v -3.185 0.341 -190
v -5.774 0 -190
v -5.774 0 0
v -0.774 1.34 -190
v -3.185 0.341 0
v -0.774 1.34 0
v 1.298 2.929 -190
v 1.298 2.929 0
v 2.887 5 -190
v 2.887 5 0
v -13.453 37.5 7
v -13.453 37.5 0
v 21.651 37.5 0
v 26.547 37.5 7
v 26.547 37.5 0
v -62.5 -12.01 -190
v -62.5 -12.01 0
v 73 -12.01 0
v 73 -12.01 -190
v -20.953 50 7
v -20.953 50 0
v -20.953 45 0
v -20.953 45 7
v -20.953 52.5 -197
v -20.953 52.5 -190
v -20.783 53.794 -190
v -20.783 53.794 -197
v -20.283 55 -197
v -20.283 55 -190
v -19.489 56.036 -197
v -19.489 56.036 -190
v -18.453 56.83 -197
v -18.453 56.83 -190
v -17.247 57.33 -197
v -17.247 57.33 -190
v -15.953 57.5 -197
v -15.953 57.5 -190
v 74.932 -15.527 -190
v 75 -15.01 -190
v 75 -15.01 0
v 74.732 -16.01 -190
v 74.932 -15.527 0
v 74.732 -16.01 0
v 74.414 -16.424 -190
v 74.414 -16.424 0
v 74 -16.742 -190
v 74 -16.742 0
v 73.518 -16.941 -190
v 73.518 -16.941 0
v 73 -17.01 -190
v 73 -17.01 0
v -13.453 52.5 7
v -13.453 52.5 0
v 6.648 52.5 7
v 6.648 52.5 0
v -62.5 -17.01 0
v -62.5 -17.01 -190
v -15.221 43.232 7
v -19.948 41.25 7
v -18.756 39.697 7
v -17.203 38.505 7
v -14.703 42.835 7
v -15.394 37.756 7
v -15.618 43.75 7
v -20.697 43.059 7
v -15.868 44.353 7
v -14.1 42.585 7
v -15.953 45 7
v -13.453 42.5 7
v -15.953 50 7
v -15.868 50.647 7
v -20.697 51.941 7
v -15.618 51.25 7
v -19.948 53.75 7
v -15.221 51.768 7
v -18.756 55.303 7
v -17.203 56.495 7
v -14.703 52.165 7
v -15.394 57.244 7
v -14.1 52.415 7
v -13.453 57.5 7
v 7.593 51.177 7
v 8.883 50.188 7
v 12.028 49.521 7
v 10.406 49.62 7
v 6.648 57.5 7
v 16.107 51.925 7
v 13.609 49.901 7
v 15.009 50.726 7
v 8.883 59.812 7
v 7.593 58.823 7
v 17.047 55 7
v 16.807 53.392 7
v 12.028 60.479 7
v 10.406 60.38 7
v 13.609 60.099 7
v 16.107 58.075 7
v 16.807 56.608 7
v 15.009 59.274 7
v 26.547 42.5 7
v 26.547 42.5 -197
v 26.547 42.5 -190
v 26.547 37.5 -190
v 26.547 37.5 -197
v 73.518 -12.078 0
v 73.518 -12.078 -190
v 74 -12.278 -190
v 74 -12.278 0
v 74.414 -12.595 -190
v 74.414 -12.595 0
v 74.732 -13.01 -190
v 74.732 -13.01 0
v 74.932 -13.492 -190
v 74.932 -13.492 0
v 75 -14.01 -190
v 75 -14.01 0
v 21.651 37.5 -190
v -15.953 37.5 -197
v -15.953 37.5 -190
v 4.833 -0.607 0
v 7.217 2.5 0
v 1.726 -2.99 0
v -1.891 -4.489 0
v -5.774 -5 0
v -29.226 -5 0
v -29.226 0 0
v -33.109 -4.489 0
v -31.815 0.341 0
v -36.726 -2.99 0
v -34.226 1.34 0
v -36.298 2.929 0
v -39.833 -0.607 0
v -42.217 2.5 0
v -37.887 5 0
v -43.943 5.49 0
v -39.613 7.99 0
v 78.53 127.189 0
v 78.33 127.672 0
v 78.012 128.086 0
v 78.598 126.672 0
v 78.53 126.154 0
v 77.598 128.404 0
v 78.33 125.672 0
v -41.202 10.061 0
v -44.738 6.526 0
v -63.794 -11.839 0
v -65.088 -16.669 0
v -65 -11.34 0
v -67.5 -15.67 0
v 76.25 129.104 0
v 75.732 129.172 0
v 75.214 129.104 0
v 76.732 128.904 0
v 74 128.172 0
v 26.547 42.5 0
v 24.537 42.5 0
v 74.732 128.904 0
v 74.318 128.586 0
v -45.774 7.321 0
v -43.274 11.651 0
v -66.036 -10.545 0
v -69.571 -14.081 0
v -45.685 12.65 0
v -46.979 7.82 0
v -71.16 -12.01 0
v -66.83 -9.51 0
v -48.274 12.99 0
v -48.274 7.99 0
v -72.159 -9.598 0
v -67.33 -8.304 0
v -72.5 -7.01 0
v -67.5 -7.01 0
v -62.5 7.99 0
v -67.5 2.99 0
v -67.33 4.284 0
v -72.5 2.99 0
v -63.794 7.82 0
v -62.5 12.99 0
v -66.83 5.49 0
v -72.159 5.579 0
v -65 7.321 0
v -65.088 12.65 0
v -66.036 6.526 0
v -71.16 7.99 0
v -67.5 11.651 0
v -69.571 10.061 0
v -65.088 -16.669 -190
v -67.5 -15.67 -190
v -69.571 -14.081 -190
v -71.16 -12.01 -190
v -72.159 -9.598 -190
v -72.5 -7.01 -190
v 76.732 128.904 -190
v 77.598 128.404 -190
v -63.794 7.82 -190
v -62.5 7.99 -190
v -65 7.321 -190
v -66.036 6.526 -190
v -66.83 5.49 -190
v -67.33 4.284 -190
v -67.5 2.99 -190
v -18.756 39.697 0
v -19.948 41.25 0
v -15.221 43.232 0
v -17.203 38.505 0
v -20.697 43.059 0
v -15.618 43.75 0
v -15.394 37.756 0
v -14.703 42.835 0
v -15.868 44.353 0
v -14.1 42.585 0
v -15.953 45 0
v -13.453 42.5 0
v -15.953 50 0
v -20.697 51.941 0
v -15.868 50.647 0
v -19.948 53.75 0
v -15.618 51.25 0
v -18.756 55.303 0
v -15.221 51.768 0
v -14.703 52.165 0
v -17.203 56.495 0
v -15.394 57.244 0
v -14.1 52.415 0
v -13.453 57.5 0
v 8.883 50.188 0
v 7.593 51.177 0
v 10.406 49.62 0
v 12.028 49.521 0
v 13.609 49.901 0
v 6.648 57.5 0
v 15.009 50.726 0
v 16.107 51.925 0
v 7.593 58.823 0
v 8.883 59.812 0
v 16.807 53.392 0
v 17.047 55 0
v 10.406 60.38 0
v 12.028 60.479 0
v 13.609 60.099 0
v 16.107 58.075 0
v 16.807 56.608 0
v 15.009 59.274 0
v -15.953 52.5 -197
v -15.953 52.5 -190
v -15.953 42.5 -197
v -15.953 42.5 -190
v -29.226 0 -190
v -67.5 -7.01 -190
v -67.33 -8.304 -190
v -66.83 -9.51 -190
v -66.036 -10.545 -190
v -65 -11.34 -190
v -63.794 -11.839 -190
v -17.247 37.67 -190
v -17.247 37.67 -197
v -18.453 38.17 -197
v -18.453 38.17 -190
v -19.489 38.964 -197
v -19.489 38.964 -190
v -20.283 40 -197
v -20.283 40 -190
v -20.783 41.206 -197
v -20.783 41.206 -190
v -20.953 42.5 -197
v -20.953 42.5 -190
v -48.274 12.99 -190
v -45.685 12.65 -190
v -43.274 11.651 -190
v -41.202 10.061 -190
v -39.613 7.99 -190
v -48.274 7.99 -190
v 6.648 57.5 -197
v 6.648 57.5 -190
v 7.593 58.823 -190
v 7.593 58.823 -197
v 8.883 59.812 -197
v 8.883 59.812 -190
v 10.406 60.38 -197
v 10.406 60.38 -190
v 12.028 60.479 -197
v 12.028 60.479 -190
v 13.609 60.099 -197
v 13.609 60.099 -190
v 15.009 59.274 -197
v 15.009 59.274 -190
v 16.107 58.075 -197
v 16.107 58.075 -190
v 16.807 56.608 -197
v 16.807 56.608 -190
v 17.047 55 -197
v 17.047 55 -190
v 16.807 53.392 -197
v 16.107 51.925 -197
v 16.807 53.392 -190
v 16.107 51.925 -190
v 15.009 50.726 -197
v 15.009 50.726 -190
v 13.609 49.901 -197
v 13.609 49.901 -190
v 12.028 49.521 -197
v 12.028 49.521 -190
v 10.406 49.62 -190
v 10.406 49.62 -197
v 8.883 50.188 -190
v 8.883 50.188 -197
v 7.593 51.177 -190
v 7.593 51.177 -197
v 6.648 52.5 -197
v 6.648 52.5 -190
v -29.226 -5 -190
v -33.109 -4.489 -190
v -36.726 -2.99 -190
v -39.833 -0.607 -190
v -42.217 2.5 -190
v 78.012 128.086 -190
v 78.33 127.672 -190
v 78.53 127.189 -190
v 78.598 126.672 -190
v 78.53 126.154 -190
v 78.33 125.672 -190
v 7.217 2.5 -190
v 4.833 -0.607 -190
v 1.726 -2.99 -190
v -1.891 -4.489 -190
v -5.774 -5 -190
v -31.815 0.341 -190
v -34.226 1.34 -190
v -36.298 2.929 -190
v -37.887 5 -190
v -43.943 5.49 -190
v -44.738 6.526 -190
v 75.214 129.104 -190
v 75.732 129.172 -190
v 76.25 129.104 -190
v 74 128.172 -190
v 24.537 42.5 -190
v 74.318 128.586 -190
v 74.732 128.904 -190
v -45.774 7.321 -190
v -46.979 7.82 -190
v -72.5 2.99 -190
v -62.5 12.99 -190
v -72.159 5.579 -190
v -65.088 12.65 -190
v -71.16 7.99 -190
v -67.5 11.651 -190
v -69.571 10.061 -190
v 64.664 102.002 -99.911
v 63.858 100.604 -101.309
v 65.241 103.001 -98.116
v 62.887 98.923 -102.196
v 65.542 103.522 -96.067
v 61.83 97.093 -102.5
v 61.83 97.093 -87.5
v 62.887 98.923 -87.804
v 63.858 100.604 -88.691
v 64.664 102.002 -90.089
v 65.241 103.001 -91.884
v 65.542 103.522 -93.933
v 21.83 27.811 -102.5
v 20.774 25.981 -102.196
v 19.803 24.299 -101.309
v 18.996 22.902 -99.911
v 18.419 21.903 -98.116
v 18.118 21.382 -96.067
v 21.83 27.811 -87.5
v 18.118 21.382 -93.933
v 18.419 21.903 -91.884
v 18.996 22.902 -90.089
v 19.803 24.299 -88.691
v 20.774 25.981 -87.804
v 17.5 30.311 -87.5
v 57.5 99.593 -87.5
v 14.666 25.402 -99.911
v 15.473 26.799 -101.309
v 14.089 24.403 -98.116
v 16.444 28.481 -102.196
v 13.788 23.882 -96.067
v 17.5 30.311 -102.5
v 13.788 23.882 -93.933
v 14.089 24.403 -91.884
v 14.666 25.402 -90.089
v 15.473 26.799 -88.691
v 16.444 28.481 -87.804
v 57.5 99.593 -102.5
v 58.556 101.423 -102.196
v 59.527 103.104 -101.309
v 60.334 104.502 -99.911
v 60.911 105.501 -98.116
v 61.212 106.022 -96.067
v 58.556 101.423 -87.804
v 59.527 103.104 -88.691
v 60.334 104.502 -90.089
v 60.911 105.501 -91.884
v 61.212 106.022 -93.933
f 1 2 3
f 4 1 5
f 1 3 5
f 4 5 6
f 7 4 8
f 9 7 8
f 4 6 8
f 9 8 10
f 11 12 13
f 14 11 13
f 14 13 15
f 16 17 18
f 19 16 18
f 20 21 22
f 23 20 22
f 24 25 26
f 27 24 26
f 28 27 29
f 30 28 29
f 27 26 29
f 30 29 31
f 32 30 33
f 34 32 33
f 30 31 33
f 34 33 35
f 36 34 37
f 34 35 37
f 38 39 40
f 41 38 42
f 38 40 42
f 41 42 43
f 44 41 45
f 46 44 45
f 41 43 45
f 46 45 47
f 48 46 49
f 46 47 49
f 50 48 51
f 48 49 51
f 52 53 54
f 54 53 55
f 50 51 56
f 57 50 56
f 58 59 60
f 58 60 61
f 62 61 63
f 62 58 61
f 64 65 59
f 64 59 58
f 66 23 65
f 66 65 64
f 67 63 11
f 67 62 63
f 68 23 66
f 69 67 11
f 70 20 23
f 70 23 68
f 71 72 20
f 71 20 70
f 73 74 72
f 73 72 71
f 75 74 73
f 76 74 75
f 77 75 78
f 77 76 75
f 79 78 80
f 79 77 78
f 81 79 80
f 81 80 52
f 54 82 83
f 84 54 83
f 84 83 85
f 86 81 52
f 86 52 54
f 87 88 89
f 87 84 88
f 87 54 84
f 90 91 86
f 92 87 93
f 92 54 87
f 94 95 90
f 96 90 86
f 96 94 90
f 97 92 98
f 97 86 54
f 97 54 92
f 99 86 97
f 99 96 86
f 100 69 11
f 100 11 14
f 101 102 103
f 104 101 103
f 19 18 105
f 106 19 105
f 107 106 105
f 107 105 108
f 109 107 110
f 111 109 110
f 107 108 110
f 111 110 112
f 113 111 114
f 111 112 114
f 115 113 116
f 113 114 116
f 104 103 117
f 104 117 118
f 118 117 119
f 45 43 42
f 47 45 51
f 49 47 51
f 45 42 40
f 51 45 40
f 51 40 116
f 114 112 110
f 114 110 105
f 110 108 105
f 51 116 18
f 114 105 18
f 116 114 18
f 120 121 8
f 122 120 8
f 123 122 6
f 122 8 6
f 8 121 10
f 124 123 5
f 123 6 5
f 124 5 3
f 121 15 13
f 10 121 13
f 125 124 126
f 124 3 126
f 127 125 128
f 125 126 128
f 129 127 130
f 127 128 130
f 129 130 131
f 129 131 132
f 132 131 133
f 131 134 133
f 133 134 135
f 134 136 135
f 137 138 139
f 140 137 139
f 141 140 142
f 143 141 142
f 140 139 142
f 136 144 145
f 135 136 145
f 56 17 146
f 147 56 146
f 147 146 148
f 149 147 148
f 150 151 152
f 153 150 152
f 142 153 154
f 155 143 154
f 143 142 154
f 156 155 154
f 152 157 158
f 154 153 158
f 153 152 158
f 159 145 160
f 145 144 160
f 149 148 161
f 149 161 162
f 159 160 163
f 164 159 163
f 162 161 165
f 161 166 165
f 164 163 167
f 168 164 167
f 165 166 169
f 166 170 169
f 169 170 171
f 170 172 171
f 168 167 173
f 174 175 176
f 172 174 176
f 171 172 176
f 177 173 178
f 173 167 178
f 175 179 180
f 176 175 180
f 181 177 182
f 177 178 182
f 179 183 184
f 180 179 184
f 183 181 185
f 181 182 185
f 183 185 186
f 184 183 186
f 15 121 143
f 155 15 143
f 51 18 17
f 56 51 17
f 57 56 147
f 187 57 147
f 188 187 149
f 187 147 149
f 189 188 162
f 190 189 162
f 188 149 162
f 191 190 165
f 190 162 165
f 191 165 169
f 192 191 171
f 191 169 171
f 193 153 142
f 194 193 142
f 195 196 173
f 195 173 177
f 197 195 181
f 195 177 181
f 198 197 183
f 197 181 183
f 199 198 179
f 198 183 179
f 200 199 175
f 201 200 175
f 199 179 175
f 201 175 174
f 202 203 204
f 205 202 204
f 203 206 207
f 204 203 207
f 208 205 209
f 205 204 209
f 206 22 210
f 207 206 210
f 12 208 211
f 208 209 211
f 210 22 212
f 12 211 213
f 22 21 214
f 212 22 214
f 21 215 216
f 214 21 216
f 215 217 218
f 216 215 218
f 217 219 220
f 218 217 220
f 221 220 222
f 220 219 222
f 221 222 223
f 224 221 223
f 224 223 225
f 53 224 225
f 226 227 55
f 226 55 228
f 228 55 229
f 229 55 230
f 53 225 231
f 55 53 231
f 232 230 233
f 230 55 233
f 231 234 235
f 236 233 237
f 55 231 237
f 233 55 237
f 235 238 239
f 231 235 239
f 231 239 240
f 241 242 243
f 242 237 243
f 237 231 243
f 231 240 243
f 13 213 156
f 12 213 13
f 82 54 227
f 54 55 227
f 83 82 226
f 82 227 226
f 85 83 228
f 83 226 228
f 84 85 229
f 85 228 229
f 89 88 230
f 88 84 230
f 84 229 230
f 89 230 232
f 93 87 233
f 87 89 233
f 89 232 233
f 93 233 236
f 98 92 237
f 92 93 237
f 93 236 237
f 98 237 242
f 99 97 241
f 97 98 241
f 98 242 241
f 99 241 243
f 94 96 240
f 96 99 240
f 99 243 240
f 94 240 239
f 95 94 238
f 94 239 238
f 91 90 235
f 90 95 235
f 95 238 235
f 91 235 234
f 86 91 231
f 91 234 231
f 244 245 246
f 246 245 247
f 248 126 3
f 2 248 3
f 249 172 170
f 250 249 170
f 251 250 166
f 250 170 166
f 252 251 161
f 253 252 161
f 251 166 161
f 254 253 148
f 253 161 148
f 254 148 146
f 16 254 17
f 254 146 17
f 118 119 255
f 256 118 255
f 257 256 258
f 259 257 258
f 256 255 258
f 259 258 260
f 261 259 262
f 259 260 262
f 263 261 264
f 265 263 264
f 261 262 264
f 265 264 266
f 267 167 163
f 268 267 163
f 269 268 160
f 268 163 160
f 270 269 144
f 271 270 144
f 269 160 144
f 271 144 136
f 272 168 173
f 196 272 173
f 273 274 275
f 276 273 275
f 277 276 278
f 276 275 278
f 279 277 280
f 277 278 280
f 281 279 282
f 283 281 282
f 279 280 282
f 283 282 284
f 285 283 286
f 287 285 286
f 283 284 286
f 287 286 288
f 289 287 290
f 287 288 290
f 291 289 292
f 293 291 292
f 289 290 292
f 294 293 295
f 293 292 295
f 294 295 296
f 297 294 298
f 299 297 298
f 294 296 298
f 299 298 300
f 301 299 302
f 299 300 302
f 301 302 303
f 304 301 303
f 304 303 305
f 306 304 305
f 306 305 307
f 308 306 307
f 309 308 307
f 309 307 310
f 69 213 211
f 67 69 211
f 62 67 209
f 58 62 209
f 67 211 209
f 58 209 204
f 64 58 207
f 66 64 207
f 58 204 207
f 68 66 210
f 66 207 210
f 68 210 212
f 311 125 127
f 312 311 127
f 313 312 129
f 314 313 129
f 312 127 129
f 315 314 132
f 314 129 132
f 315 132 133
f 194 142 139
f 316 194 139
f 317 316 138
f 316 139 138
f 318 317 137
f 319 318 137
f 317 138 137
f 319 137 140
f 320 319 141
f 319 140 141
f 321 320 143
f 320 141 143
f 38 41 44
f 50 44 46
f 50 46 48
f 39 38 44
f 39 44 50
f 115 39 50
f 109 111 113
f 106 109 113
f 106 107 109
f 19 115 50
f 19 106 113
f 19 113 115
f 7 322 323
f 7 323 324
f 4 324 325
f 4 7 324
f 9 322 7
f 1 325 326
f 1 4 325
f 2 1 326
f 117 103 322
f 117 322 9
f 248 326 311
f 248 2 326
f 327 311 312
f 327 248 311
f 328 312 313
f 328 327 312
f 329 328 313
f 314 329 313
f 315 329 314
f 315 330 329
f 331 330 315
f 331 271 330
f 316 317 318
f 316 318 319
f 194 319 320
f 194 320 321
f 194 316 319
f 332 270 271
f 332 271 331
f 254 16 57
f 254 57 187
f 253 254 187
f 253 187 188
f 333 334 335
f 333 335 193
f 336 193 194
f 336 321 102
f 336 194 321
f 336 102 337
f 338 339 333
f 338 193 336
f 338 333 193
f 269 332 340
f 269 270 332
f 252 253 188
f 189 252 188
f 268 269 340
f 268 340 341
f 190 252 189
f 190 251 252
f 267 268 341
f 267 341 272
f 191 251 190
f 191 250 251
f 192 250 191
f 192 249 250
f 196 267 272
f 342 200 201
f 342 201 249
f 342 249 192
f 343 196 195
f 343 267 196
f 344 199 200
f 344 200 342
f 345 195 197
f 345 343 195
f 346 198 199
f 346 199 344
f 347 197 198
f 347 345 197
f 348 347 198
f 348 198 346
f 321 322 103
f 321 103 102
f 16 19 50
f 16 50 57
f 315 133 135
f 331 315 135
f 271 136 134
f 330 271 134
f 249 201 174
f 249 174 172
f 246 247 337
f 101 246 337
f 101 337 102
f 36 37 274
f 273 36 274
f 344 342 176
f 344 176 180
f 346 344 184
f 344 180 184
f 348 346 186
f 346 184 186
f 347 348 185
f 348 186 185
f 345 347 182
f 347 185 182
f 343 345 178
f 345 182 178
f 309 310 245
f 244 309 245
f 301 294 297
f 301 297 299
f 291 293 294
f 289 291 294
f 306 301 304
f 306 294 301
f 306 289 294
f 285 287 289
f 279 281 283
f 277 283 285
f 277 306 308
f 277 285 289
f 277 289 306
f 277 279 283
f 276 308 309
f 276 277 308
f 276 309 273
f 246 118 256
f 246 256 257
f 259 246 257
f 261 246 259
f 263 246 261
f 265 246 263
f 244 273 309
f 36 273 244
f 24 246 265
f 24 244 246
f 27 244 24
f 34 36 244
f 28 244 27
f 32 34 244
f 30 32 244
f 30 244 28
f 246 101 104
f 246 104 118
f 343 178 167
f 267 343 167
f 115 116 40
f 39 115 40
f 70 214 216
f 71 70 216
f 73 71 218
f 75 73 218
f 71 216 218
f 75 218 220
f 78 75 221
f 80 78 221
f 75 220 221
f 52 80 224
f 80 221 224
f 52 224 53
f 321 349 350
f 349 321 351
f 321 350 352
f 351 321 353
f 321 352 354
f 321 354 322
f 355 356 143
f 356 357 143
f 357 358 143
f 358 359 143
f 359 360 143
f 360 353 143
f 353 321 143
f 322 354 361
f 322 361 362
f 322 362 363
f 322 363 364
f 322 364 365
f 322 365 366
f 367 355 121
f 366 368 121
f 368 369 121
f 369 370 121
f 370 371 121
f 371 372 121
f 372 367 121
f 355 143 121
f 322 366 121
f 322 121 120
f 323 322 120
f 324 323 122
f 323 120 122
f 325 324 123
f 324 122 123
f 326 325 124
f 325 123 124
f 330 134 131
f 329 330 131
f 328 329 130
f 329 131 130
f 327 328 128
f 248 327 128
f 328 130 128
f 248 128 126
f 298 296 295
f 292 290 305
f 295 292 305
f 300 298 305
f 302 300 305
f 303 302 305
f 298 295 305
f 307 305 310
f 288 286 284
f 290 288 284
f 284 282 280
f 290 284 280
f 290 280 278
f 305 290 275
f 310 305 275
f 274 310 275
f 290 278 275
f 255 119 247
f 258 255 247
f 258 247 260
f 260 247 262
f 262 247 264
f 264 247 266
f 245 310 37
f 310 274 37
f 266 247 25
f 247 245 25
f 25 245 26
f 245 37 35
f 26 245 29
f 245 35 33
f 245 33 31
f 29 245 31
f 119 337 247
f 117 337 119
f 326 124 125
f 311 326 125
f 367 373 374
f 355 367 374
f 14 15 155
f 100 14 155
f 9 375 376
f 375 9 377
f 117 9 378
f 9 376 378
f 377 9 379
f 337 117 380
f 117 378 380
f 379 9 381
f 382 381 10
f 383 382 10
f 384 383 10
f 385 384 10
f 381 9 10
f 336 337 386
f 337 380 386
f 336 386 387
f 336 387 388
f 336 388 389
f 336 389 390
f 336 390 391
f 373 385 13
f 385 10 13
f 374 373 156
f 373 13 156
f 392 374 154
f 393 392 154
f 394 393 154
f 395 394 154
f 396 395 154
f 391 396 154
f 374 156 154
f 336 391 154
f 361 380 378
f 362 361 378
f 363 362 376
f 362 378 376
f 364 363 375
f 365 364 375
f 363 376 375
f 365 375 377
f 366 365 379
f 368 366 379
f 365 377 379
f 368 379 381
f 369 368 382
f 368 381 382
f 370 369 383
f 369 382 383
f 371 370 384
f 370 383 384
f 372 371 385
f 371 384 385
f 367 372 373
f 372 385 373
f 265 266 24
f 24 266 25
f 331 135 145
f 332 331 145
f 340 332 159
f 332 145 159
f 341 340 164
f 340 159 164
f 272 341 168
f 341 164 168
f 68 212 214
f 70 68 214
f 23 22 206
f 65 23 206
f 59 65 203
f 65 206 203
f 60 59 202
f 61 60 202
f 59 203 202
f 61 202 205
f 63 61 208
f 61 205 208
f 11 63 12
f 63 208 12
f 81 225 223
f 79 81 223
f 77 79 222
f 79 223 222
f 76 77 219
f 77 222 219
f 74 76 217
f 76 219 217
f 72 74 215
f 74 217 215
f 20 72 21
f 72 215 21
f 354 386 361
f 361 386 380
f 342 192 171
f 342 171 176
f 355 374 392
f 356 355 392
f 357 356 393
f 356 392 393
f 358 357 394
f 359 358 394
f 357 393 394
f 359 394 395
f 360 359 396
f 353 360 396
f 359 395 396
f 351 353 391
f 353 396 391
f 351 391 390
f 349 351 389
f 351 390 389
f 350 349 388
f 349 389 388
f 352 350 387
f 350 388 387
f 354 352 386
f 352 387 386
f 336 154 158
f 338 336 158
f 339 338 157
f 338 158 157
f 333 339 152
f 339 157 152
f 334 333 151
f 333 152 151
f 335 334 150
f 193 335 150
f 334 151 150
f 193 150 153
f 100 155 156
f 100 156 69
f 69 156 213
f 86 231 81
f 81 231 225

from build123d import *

# Parameters (mm, degrees)
EXTRUDE_12_DEPTH    = 190
CUT_EXTRUDE_1_REACH = 78.573
SKETCH_3_12_R       = 5.5
EXTRUDE_13_DEPTH    = 7
EXTRUDE_14_DEPTH    = 7
EXTRUDE_16_DEPTH    = 7


with BuildPart() as part:
    # Sketch 3 → Extrude 12 (new body)
    with BuildSketch(Plane.XY):
        with BuildLine():
            ThreePointArc((74, 128.17175976), (75.214412717, 129.103611413), (76.732050808, 128.903810568))
            Line((76.732050808, 128.903810568), (77.598076211, 128.403810568))
            ThreePointArc((77.598076211, 128.403810568), (78.529927864, 127.18939785), (78.330127019, 125.67175976))
            Line((78.330127019, 125.67175976), (7.216878365, 2.5))
            ThreePointArc((7.216878365, 2.5), (1.726497308, -2.990381057), (-5.773502692, -5))
            Line((-5.773502692, -5), (-29.226497308, -5))
            ThreePointArc((-29.226497308, -5), (-36.726497308, -2.990381057), (-42.216878365, 2.5))
            Line((-42.216878365, 2.5), (-43.943375673, 5.490381057))
            ThreePointArc((-43.943375673, 5.490381057), (-45.773502692, 7.320508076), (-48.273502692, 7.990381057))
            Line((-48.273502692, 7.990381057), (-62.5, 7.990381057))
            ThreePointArc((-62.5, 7.990381057), (-66.035533906, 6.525914963), (-67.5, 2.990381057))
            Line((-67.5, 2.990381057), (-67.5, -7.009618943))
            ThreePointArc((-67.5, -7.009618943), (-66.035533906, -10.545152849), (-62.5, -12.009618943))
            Line((-62.5, -12.009618943), (73, -12.009618943))
            ThreePointArc((73, -12.009618943), (74.414213562, -12.595405381), (75, -14.009618943))
            Line((75, -14.009618943), (75, -15.009618943))
            ThreePointArc((75, -15.009618943), (74.414213562, -16.423832506), (73, -17.009618943))
            Line((73, -17.009618943), (-62.5, -17.009618943))
            ThreePointArc((-62.5, -17.009618943), (-69.571067812, -14.080686755), (-72.5, -7.009618943))
            Line((-72.5, -7.009618943), (-72.5, 2.990381057))
            ThreePointArc((-72.5, 2.990381057), (-69.571067812, 10.061448869), (-62.5, 12.990381057))
            Line((-62.5, 12.990381057), (-48.273502692, 12.990381057))
            ThreePointArc((-48.273502692, 12.990381057), (-43.273502692, 11.650635095), (-39.613248654, 7.990381057))
            Line((-39.613248654, 7.990381057), (-37.886751346, 5))
            ThreePointArc((-37.886751346, 5), (-34.226497308, 1.339745962), (-29.226497308, 0))
            Line((-29.226497308, 0), (-5.773502692, 0))
            ThreePointArc((-5.773502692, 0), (-0.773502692, 1.339745962), (2.886751346, 5))
            Line((2.886751346, 5), (74, 128.17175976))
        make_face()
    extrude(amount=-EXTRUDE_12_DEPTH)

    # Sketch 19 → Cut-Extrude 1 (cut, up to next)
    with BuildSketch(Plane(origin=(0, 0, 0), x_dir=(0, 0, 1), z_dir=(-0.866025404, 0.5, 0)), mode=Mode.PRIVATE) as cut_extrude_1_sk1:
        with BuildLine():
            Line((-95, 107.5), (-95, 115))
            Line((-95, 115), (-102.5, 115))
            ThreePointArc((-102.5, 115), (-100.303300859, 109.696699141), (-95, 107.5))
        make_face()
    cut_extrude_1_tool1 = extrude(cut_extrude_1_sk1.sketch, amount=-CUT_EXTRUDE_1_REACH, mode=Mode.PRIVATE) & part.part
    add(cut_extrude_1_tool1.solids().sort_by_distance((55.908451, 96.836277, -98.183099))[0], mode=Mode.SUBTRACT)
    # Sketch 19 → Cut-Extrude 1 (cut, up to next)
    with BuildSketch(Plane(origin=(0, 0, 0), x_dir=(0, 0, 1), z_dir=(-0.866025404, 0.5, 0)), mode=Mode.PRIVATE) as cut_extrude_1_sk2:
        with BuildLine():
            Line((-87.5, 115), (-95, 115))
            Line((-95, 115), (-95, 107.5))
            ThreePointArc((-95, 107.5), (-89.696699141, 109.696699141), (-87.5, 115))
        make_face()
    cut_extrude_1_tool2 = extrude(cut_extrude_1_sk2.sketch, amount=-CUT_EXTRUDE_1_REACH, mode=Mode.PRIVATE) & part.part
    add(cut_extrude_1_tool2.solids().sort_by_distance((55.908451, 96.836277, -91.816901))[0], mode=Mode.SUBTRACT)
    # Sketch 19 → Cut-Extrude 1 (cut, up to next)
    with BuildSketch(Plane(origin=(0, 0, 0), x_dir=(0, 0, 1), z_dir=(-0.866025404, 0.5, 0)), mode=Mode.PRIVATE) as cut_extrude_1_sk3:
        with BuildLine():
            Line((-102.5, 115), (-95, 115))
            Line((-95, 115), (-87.5, 115))
            ThreePointArc((-87.5, 115), (-95, 122.5), (-102.5, 115))
        make_face()
    cut_extrude_1_tool3 = extrude(cut_extrude_1_sk3.sketch, amount=-CUT_EXTRUDE_1_REACH, mode=Mode.PRIVATE) & part.part
    add(cut_extrude_1_tool3.solids().sort_by_distance((59.091549, 102.349566, -95))[0], mode=Mode.SUBTRACT)
    # Sketch 19 → Cut-Extrude 1 (cut, up to next)
    with BuildSketch(Plane(origin=(0, 0, 0), x_dir=(0, 0, 1), z_dir=(-0.866025404, 0.5, 0)), mode=Mode.PRIVATE) as cut_extrude_1_sk4:
        with BuildLine():
            ThreePointArc((-95, 107.5), (-100.303300859, 109.696699141), (-102.5, 115))
            Line((-102.5, 115), (-102.5, 35))
            ThreePointArc((-102.5, 35), (-100.303300859, 40.303300859), (-95, 42.5))
            Line((-95, 42.5), (-95, 107.5))
        make_face()
    cut_extrude_1_tool4 = extrude(cut_extrude_1_sk4.sketch, amount=-CUT_EXTRUDE_1_REACH, mode=Mode.PRIVATE) & part.part
    add(cut_extrude_1_tool4.solids().sort_by_distance((37.5, 64.951905, -98.8479))[0], mode=Mode.SUBTRACT)
    # Sketch 19 → Cut-Extrude 1 (cut, up to next)
    with BuildSketch(Plane(origin=(0, 0, 0), x_dir=(0, 0, 1), z_dir=(-0.866025404, 0.5, 0)), mode=Mode.PRIVATE) as cut_extrude_1_sk5:
        with BuildLine():
            ThreePointArc((-87.5, 115), (-89.696699141, 109.696699141), (-95, 107.5))
            Line((-95, 107.5), (-95, 42.5))
            ThreePointArc((-95, 42.5), (-89.696699141, 40.303300859), (-87.5, 35))
            Line((-87.5, 35), (-87.5, 115))
        make_face()
    cut_extrude_1_tool5 = extrude(cut_extrude_1_sk5.sketch, amount=-CUT_EXTRUDE_1_REACH, mode=Mode.PRIVATE) & part.part
    add(cut_extrude_1_tool5.solids().sort_by_distance((37.5, 64.951905, -91.1521))[0], mode=Mode.SUBTRACT)
    # Sketch 19 → Cut-Extrude 1 (cut, up to next)
    with BuildSketch(Plane(origin=(0, 0, 0), x_dir=(0, 0, 1), z_dir=(-0.866025404, 0.5, 0)), mode=Mode.PRIVATE) as cut_extrude_1_sk6:
        with BuildLine():
            ThreePointArc((-95, 42.5), (-100.303300859, 40.303300859), (-102.5, 35))
            Line((-102.5, 35), (-95, 35))
            Line((-95, 35), (-95, 42.5))
        make_face()
    cut_extrude_1_tool6 = extrude(cut_extrude_1_sk6.sketch, amount=-CUT_EXTRUDE_1_REACH, mode=Mode.PRIVATE) & part.part
    add(cut_extrude_1_tool6.solids().sort_by_distance((19.091549, 33.067534, -98.183099))[0], mode=Mode.SUBTRACT)
    # Sketch 19 → Cut-Extrude 1 (cut, up to next)
    with BuildSketch(Plane(origin=(0, 0, 0), x_dir=(0, 0, 1), z_dir=(-0.866025404, 0.5, 0)), mode=Mode.PRIVATE) as cut_extrude_1_sk7:
        with BuildLine():
            Line((-95, 35), (-102.5, 35))
            ThreePointArc((-102.5, 35), (-95, 27.5), (-87.5, 35))
            Line((-87.5, 35), (-95, 35))
        make_face()
    cut_extrude_1_tool7 = extrude(cut_extrude_1_sk7.sketch, amount=-CUT_EXTRUDE_1_REACH, mode=Mode.PRIVATE) & part.part
    add(cut_extrude_1_tool7.solids().sort_by_distance((15.908451, 27.554245, -95))[0], mode=Mode.SUBTRACT)
    # Sketch 19 → Cut-Extrude 1 (cut, up to next)
    with BuildSketch(Plane(origin=(0, 0, 0), x_dir=(0, 0, 1), z_dir=(-0.866025404, 0.5, 0)), mode=Mode.PRIVATE) as cut_extrude_1_sk8:
        with BuildLine():
            ThreePointArc((-87.5, 35), (-89.696699141, 40.303300859), (-95, 42.5))
            Line((-95, 42.5), (-95, 35))
            Line((-95, 35), (-87.5, 35))
        make_face()
    cut_extrude_1_tool8 = extrude(cut_extrude_1_sk8.sketch, amount=-CUT_EXTRUDE_1_REACH, mode=Mode.PRIVATE) & part.part
    add(cut_extrude_1_tool8.solids().sort_by_distance((19.091549, 33.067534, -91.816901))[0], mode=Mode.SUBTRACT)



with BuildPart() as body_2:
    # Sketch 3_12 → Extrude 13 (new body)
    with BuildSketch(Plane.XY):
        with Locations((11.547005384, 55)):
            Circle(SKETCH_3_12_R)
    extrude(amount=EXTRUDE_13_DEPTH)


with BuildPart() as part_1:
    add(part.part)

    add(body_2.part)  # Extrude 14 merges body 2
    # Sketch 20 → Extrude 14 (add)
    with BuildSketch(Plane.XY):
        with BuildLine():
            Line((-13.452994616, 55), (11.547005384, 55))
            Line((11.547005384, 55), (11.547005384, 57.5))
            Line((11.547005384, 57.5), (-13.452994616, 57.5))
            ThreePointArc((-13.452994616, 57.5), (-18.756295475, 55.303300859), (-20.952994616, 50))
            Line((-20.952994616, 50), (-20.952994616, 45))
            ThreePointArc((-20.952994616, 45), (-18.756295475, 39.696699141), (-13.452994616, 37.5))
            Line((-13.452994616, 37.5), (26.547005384, 37.5))
            Line((26.547005384, 37.5), (26.547005384, 40))
            Line((26.547005384, 40), (-13.452994616, 40))
            ThreePointArc((-13.452994616, 40), (-16.988528522, 41.464466094), (-18.452994616, 45))
            Line((-18.452994616, 45), (-18.452994616, 50))
            ThreePointArc((-18.452994616, 50), (-16.988528522, 53.535533906), (-13.452994616, 55))
        make_face()
        with BuildLine():
            Line((11.547005384, 52.5), (11.547005384, 55))
            Line((11.547005384, 55), (-13.452994616, 55))
            ThreePointArc((-13.452994616, 55), (-16.988528522, 53.535533906), (-18.452994616, 50))
            Line((-18.452994616, 50), (-18.452994616, 45))
            ThreePointArc((-18.452994616, 45), (-16.988528522, 41.464466094), (-13.452994616, 40))
            Line((-13.452994616, 40), (26.547005384, 40))
            Line((26.547005384, 40), (26.547005384, 42.5))
            Line((26.547005384, 42.5), (-13.452994616, 42.5))
            ThreePointArc((-13.452994616, 42.5), (-15.220761569, 43.232233047), (-15.952994616, 45))
            Line((-15.952994616, 45), (-15.952994616, 50))
            ThreePointArc((-15.952994616, 50), (-15.220761569, 51.767766953), (-13.452994616, 52.5))
            Line((-13.452994616, 52.5), (11.547005384, 52.5))
        make_face()
    extrude(amount=EXTRUDE_14_DEPTH)

    # Sketch 21 → Extrude 16 (add)
    with BuildSketch(Plane(origin=(0, 0, -190), x_dir=(-1, 0, 0), z_dir=(0, 0, -1))):
        with BuildLine():
            Line((-11.547005384, 52.5), (-11.547005384, 55))
            Line((-11.547005384, 55), (-11.547005384, 57.5))
            Line((-11.547005384, 57.5), (-6.648025898, 57.5))
            ThreePointArc((-6.648025898, 57.5), (-17.047005384, 55), (-6.648025898, 52.5))
            Line((-6.648025898, 52.5), (-11.547005384, 52.5))
        make_face()
        with BuildLine():
            Line((-11.547005384, 57.5), (-11.547005384, 55))
            Line((-11.547005384, 55), (-6.047005384, 55))
            ThreePointArc((-6.047005384, 55), (-6.199370992, 56.285615189), (-6.648025898, 57.5))
            Line((-6.648025898, 57.5), (-11.547005384, 57.5))
        make_face()
        with BuildLine():
            Line((-6.047005384, 55), (-11.547005384, 55))
            Line((-11.547005384, 55), (-11.547005384, 52.5))
            Line((-11.547005384, 52.5), (-6.648025898, 52.5))
            ThreePointArc((-6.648025898, 52.5), (-6.199370992, 53.714384811), (-6.047005384, 55))
        make_face()
        with BuildLine():
            ThreePointArc((-6.648025898, 57.5), (-6.199370992, 56.285615189), (-6.047005384, 55))
            Line((-6.047005384, 55), (15.952994616, 55))
            ThreePointArc((15.952994616, 55), (17.720761569, 54.267766953), (18.452994616, 52.5))
            Line((18.452994616, 52.5), (18.452994616, 42.5))
            ThreePointArc((18.452994616, 42.5), (17.720761569, 40.732233047), (15.952994616, 40))
            Line((15.952994616, 40), (-23.094010768, 40))
            Line((-23.094010768, 40), (-21.650635095, 37.5))
            Line((-21.650635095, 37.5), (15.952994616, 37.5))
            ThreePointArc((15.952994616, 37.5), (19.488528522, 38.964466094), (20.952994616, 42.5))
            Line((20.952994616, 42.5), (20.952994616, 52.5))
            ThreePointArc((20.952994616, 52.5), (19.488528522, 56.035533906), (15.952994616, 57.5))
            Line((15.952994616, 57.5), (-6.648025898, 57.5))
        make_face()
        with BuildLine():
            Line((15.952994616, 55), (-6.047005384, 55))
            ThreePointArc((-6.047005384, 55), (-6.199370992, 53.714384811), (-6.648025898, 52.5))
            Line((-6.648025898, 52.5), (15.952994616, 52.5))
            Line((15.952994616, 52.5), (15.952994616, 42.5))
            Line((15.952994616, 42.5), (-24.537386441, 42.5))
            Line((-24.537386441, 42.5), (-23.094010768, 40))
            Line((-23.094010768, 40), (15.952994616, 40))
            ThreePointArc((15.952994616, 40), (17.720761569, 40.732233047), (18.452994616, 42.5))
            Line((18.452994616, 42.5), (18.452994616, 52.5))
            ThreePointArc((18.452994616, 52.5), (17.720761569, 54.267766953), (15.952994616, 55))
        make_face()
        Polygon((-23.094010768, 40), (-24.537386441, 42.5), (-26.547005384, 42.5), (-26.547005384, 40), align=None)
        Polygon((-21.650635095, 37.5), (-23.094010768, 40), (-26.547005384, 40), (-26.547005384, 37.5), align=None)
    extrude(amount=EXTRUDE_16_DEPTH)


solid = part_1.part
